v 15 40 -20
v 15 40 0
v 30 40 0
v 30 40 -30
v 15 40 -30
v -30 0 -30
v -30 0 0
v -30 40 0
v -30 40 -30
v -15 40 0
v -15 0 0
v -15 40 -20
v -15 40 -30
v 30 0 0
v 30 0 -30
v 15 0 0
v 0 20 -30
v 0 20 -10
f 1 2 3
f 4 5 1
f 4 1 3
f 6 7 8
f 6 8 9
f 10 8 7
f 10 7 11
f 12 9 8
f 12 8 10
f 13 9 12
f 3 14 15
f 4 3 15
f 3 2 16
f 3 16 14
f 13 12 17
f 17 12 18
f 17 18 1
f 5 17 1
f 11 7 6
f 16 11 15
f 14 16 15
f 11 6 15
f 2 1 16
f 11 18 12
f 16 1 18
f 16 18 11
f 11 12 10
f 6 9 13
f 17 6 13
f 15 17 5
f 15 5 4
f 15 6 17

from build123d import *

# Parameters (mm, degrees)
SKETCH_1_W          = 60
SKETCH_1_H          = 30
EXTRUDE_1_DEPTH     = 40
CUT_EXTRUDE_1_DEPTH = 59.309518948
CUT_EXTRUDE_2_DEPTH = 15


with BuildPart() as part:
    # 草圖1 → 填料-伸長1 (new body)
    with BuildSketch(Plane(origin=(0, 0, 0), x_dir=(1, 0, 0), z_dir=(0, 1, 0))):
        with Locations((0, 15)):
            Rectangle(SKETCH_1_W, SKETCH_1_H)
    extrude(amount=EXTRUDE_1_DEPTH)

    # 草圖3 → 除料-伸長1 (cut, through all)
    with BuildSketch(Plane.XY):
        Polygon((-15, 40), (0, 20), (15, 40), align=None)
    extrude(amount=-CUT_EXTRUDE_1_DEPTH, mode=Mode.SUBTRACT)

    # 草圖4 → 除料-伸長2 (cut, symmetric)
    with BuildSketch(Plane(origin=(0, 0, 0), x_dir=(0, 0, -1), z_dir=(1, 0, 0))):
        Polygon((0, 40), (20, 40), (0, 0), align=None)
    extrude(amount=CUT_EXTRUDE_2_DEPTH, both=True, mode=Mode.SUBTRACT)


solid = part.part
